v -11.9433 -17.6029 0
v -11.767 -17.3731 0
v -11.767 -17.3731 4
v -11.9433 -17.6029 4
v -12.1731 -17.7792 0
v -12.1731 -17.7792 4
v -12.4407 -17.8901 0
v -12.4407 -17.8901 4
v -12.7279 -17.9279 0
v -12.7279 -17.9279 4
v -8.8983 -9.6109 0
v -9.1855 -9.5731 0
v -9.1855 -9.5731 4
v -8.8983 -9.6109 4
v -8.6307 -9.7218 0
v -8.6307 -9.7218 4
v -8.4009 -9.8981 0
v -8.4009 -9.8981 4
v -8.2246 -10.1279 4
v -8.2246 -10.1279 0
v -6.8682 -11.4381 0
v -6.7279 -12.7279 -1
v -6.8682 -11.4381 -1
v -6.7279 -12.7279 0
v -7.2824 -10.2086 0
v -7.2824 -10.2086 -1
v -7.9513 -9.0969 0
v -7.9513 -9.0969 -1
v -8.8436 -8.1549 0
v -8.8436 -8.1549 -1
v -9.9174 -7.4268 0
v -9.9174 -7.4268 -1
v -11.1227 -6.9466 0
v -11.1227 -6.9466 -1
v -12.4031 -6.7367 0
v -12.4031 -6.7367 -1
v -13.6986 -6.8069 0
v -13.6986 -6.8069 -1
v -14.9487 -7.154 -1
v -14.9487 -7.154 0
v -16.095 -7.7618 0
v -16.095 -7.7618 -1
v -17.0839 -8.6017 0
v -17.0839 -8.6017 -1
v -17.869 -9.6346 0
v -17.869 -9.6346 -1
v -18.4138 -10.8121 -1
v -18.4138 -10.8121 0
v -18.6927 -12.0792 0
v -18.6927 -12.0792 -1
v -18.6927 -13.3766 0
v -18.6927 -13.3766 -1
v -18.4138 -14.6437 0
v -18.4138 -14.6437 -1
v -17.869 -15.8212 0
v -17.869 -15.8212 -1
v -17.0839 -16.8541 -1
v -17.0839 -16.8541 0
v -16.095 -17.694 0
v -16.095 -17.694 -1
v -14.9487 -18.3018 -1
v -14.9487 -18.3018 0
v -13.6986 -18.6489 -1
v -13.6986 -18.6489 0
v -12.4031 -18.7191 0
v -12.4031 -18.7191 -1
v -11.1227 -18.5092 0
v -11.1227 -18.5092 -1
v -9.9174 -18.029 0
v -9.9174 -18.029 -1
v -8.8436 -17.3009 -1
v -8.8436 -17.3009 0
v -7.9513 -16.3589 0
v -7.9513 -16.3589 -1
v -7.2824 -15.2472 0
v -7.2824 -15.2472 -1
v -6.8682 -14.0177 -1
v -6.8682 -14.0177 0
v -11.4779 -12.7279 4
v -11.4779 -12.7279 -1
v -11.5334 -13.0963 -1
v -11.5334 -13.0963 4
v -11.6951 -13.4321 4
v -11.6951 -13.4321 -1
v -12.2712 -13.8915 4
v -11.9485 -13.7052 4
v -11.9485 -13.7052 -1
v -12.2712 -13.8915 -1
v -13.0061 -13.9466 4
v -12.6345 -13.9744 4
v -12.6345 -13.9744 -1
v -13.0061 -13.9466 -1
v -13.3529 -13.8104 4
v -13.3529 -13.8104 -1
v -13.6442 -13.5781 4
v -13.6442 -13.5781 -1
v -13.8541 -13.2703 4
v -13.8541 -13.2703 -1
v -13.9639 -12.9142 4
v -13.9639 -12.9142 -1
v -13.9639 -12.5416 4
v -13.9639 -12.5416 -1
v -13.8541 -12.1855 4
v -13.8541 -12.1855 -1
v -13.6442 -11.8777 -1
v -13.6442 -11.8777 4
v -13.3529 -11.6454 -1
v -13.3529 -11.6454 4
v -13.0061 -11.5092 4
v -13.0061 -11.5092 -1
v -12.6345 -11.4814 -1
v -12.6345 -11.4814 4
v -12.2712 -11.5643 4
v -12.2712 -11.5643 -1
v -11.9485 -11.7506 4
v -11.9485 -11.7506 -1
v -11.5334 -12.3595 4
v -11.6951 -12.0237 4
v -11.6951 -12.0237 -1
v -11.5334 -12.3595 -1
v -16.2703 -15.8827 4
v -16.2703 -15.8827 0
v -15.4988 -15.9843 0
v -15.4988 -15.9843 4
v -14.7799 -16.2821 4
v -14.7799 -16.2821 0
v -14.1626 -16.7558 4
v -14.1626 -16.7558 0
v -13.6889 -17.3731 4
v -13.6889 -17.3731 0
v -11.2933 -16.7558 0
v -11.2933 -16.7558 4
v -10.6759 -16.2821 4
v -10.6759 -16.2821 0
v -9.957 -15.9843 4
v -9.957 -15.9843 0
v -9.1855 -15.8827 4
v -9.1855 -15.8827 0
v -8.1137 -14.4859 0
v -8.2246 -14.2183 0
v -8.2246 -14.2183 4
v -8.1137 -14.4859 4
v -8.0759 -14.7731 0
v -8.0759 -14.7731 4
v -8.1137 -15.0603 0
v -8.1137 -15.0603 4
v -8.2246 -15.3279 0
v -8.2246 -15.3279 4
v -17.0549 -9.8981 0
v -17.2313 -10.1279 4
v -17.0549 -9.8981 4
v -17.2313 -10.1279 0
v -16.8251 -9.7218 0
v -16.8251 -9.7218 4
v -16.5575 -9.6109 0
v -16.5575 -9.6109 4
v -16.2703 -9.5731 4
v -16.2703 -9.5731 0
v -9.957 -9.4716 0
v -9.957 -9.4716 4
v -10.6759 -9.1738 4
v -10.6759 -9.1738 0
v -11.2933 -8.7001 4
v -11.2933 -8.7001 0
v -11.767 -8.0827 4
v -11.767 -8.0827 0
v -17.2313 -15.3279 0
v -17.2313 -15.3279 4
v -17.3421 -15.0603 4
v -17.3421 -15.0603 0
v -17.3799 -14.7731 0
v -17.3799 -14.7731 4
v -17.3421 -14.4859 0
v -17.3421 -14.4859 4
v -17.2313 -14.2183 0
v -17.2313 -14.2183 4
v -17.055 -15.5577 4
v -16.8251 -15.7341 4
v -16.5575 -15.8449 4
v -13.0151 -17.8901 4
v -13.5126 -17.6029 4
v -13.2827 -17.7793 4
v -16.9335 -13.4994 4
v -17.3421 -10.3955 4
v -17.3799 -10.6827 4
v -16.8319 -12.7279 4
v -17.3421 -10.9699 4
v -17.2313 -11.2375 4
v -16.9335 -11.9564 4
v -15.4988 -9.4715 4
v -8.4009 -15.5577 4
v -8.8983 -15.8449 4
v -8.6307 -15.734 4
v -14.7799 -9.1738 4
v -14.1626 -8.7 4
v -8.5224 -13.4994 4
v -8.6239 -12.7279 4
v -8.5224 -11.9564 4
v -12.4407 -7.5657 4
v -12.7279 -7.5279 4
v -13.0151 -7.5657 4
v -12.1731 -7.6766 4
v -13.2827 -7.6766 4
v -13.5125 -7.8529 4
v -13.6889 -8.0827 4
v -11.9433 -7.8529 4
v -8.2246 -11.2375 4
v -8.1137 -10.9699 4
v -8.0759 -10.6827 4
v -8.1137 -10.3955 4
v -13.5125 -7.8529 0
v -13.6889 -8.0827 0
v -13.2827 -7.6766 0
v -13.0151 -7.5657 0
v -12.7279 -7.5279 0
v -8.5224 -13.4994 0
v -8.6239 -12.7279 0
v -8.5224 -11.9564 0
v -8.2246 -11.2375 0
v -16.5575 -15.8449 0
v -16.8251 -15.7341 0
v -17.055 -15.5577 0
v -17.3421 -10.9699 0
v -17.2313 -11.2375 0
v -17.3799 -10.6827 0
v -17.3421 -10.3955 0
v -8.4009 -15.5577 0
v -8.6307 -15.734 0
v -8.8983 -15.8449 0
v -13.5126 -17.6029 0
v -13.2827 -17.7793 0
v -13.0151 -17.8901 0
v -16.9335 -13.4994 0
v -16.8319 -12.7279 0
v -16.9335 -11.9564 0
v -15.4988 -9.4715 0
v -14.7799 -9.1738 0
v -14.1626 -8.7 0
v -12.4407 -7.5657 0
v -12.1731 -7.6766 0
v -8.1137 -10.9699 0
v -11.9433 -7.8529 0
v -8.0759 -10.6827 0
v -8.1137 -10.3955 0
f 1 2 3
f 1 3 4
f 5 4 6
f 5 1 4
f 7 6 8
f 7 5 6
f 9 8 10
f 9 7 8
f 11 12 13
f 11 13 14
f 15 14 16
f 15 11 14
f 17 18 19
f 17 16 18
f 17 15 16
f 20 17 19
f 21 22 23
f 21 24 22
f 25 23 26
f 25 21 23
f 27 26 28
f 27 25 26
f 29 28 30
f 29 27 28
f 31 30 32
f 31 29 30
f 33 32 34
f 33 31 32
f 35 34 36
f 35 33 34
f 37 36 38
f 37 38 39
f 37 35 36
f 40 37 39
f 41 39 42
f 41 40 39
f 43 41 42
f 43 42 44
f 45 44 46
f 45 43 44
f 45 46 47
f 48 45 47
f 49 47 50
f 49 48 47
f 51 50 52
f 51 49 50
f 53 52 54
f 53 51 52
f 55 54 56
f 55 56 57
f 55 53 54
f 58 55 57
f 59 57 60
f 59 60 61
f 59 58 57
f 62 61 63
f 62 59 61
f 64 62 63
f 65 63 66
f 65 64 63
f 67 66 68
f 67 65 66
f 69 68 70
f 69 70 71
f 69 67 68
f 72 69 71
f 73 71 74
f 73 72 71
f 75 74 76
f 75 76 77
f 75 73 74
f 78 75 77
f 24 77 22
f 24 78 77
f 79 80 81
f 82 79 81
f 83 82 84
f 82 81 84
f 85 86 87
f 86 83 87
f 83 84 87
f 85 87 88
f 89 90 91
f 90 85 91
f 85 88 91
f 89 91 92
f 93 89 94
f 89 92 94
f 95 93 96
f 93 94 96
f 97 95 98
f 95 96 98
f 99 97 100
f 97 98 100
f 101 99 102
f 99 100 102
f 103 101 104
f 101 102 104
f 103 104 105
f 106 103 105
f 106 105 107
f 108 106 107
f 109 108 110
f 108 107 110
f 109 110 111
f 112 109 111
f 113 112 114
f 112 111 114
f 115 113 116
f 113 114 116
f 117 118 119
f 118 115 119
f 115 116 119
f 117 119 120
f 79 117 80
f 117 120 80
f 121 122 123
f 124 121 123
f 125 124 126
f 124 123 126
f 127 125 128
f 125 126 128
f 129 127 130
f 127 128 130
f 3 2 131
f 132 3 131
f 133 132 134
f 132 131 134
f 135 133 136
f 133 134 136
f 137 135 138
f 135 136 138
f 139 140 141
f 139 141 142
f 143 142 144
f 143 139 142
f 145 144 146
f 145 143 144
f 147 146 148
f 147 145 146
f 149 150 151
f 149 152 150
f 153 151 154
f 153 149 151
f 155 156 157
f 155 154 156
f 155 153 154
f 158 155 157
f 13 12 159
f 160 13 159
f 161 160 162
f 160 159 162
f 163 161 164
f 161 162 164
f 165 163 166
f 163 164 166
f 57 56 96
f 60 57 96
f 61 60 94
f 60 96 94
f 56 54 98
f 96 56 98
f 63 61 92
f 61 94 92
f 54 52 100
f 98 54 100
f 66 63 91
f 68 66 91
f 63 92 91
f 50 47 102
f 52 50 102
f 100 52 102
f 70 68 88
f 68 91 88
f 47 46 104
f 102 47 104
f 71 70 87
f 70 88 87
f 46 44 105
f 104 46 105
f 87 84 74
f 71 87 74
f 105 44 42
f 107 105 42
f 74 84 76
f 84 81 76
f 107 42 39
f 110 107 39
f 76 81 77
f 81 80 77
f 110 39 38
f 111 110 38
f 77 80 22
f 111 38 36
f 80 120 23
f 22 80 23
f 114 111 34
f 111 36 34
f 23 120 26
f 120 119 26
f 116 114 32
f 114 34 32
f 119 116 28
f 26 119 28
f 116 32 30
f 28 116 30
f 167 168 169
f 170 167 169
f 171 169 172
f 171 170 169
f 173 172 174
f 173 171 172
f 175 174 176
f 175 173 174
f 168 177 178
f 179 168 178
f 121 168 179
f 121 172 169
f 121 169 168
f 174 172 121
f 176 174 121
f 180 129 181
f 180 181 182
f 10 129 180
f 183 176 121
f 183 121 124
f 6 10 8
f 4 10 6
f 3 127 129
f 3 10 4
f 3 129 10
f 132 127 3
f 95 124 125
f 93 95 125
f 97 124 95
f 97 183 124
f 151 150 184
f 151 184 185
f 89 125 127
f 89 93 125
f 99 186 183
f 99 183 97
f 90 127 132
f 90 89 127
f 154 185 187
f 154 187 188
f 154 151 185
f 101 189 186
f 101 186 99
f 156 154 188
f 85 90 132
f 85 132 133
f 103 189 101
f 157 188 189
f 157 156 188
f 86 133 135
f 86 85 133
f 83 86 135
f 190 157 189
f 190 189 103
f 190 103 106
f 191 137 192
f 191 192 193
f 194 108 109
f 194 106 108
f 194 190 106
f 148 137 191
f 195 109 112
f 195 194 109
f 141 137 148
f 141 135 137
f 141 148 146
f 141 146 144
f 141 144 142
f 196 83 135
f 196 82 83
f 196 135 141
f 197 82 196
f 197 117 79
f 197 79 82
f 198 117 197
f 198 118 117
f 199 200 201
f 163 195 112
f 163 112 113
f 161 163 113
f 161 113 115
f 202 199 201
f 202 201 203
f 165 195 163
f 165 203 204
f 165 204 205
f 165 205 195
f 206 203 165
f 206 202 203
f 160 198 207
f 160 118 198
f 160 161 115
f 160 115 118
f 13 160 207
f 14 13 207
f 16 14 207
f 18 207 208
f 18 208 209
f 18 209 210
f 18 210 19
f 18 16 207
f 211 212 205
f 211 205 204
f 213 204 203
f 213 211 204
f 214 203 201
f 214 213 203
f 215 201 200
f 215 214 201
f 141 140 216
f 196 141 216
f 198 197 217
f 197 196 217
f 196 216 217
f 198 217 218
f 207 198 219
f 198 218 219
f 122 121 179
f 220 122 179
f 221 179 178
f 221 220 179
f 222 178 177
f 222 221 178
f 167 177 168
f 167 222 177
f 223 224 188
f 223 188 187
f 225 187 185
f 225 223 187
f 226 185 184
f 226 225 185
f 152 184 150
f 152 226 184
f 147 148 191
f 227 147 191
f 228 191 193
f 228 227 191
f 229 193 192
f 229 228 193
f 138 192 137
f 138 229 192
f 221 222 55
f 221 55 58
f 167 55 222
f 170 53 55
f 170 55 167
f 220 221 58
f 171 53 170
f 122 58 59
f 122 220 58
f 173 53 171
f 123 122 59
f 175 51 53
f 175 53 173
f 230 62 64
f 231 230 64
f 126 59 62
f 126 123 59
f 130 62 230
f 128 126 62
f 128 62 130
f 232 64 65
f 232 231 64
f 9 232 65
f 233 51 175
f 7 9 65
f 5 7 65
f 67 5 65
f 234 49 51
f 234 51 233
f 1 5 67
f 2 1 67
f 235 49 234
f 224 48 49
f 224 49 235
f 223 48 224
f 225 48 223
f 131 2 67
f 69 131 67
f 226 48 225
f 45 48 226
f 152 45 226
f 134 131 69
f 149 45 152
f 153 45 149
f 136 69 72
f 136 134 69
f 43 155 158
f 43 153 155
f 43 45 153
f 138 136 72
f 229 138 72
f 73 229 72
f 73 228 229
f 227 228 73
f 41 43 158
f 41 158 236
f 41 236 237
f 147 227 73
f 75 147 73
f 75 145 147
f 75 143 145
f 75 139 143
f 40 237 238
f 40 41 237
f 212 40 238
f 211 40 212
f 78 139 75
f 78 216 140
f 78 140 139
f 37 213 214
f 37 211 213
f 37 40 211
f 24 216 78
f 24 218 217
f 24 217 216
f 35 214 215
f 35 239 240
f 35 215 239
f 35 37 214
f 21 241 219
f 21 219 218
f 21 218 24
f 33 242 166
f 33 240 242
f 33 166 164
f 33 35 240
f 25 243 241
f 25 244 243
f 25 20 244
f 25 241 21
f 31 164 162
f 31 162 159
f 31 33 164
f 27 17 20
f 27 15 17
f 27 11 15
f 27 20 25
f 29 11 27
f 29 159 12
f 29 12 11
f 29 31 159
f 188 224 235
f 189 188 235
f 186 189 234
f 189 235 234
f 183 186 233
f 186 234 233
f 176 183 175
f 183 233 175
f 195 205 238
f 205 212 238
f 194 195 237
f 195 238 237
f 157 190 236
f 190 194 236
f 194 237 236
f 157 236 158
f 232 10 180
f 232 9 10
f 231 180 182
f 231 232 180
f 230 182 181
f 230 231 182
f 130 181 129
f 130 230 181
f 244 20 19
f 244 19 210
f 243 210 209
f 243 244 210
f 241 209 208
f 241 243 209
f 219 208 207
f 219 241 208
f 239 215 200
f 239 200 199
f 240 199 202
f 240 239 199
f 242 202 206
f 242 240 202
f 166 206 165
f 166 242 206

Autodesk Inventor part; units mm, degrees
ref_plane "YZ Plane" through (0, 0, 0) normal (1, 0, 0) x (0, 1, 0)
ref_plane "XZ Plane" through (0, 0, 0) normal (0, 1, 0) x (-1, 0, 0)
ref_plane "XY Plane" through (0, 0, 0) normal (0, 0, 1) x (1, 0, 0)
sketch "スケッチ1" plane through (0, 0, 0) normal (0, 0, 1) x (1, 0, 0)
  arc A0 (-16.2703, -9.5731) -> (-13.6889, -8.0827) centre (-16.2703, -6.5923) ccw
  arc A1 (-16.2703, -9.5731) -> (-17.2313, -10.1279) centre (-16.2703, -10.6827) ccw
  arc A2 (-17.2313, -10.1279) -> (-17.2313, -11.2375) centre (-16.2703, -10.6827) ccw
  arc A3 (-17.2313, -14.2183) -> (-17.2313, -11.2375) centre (-19.8127, -12.7279) ccw
  arc A4 (-17.2313, -14.2183) -> (-17.2313, -15.3279) centre (-16.2703, -14.7731) ccw
  arc A5 (-17.2313, -15.3279) -> (-16.2703, -15.8827) centre (-16.2703, -14.7731) ccw
  arc A6 (-13.6889, -17.3731) -> (-16.2703, -15.8827) centre (-16.2703, -18.8635) ccw
  arc A7 (-13.6889, -17.3731) -> (-12.7279, -17.9279) centre (-12.7279, -16.8183) ccw
  arc A8 (-12.7279, -17.9279) -> (-11.767, -17.3731) centre (-12.7279, -16.8183) ccw
  arc A9 (-9.1855, -15.8827) -> (-11.767, -17.3731) centre (-9.1855, -18.8635) ccw
  arc A10 (-9.1855, -15.8827) -> (-8.2246, -15.3279) centre (-9.1855, -14.7731) ccw
  arc A11 (-8.2246, -15.3279) -> (-8.2246, -14.2183) centre (-9.1855, -14.7731) ccw
  arc A12 (-8.2246, -11.2375) -> (-8.2246, -14.2183) centre (-5.6431, -12.7279) ccw
  arc A13 (-8.2246, -11.2375) -> (-8.2246, -10.1279) centre (-9.1855, -10.6827) ccw
  arc A14 (-8.2246, -10.1279) -> (-9.1855, -9.5731) centre (-9.1855, -10.6827) ccw
  arc A15 (-11.767, -8.0827) -> (-9.1855, -9.5731) centre (-9.1855, -6.5923) ccw
  arc A16 (-11.767, -8.0827) -> (-12.7279, -7.5279) centre (-12.7279, -8.6375) ccw
  arc A17 (-12.7279, -7.5279) -> (-13.6889, -8.0827) centre (-12.7279, -8.6375) ccw
  circle A18 centre (-12.7279, -12.7279) radius 1.5 construction
  circle A19 centre (-12.7279, -12.7279) radius 1.25
  circle A20 centre (-12.7279, -12.7279) radius 6
  point P0 (0, 0)
  point P1 (0, 0)
  dimension "d0" = 2.5
extrude "押し出し1" add sketch "スケッチ1" against normal blind 1 contours A0 A17 A16 A15 A14 A13 A12 A11 A10 A9 A8 A7 A6 A5 A4 A3 A2 A1 | A20
extrude "押し出し2" add sketch "スケッチ1" along normal blind 4 contours A0 A17 A16 A15 A14 A13 A12 A11 A10 A9 A8 A7 A6 A5 A4 A3 A2 A1
sketch "書き出し" plane through (0, 0, 4) normal (0, 0, 1) x (1, 0, 0)
  arc A0 (-13.6889, -17.3731) -> (-11.767, -17.3731) centre (-12.7279, -16.8183) ccw projected
  arc A1 (-9.1855, -15.8827) -> (-11.767, -17.3731) centre (-9.1855, -18.8635) ccw projected
  arc A2 (-9.1855, -15.8827) -> (-8.2246, -14.2183) centre (-9.1855, -14.7731) ccw projected
  arc A3 (-8.2246, -11.2375) -> (-8.2246, -14.2183) centre (-5.6431, -12.7279) ccw projected
  arc A4 (-8.2246, -11.2375) -> (-9.1855, -9.5731) centre (-9.1855, -10.6827) ccw projected
  arc A5 (-11.767, -8.0827) -> (-9.1855, -9.5731) centre (-9.1855, -6.5923) ccw projected
  arc A6 (-11.767, -8.0827) -> (-13.6889, -8.0827) centre (-12.7279, -8.6375) ccw projected
  arc A7 (-16.2703, -9.5731) -> (-13.6889, -8.0827) centre (-16.2703, -6.5923) ccw projected
  arc A8 (-16.2703, -9.5731) -> (-17.2313, -11.2375) centre (-16.2703, -10.6827) ccw projected
  arc A9 (-17.2313, -14.2183) -> (-17.2313, -11.2375) centre (-19.8127, -12.7279) ccw projected
  arc A10 (-17.2313, -14.2183) -> (-16.2703, -15.8827) centre (-16.2703, -14.7731) ccw projected
  arc A11 (-13.6889, -17.3731) -> (-16.2703, -15.8827) centre (-16.2703, -18.8635) ccw projected
  circle A12 centre (-12.7279, -12.7279) radius 1.25 projected
  arc A13 (-13.6889, -17.3731) -> (-16.2703, -15.8827) centre (-16.2703, -18.8635) ccw projected
  arc A14 (-17.2313, -14.2183) -> (-16.2703, -15.8827) centre (-16.2703, -14.7731) ccw projected
  arc A15 (-17.2313, -14.2183) -> (-17.2313, -11.2375) centre (-19.8127, -12.7279) ccw projected
  arc A16 (-16.2703, -9.5731) -> (-17.2313, -11.2375) centre (-16.2703, -10.6827) ccw projected
  arc A17 (-16.2703, -9.5731) -> (-13.6889, -8.0827) centre (-16.2703, -6.5923) ccw projected
  arc A18 (-11.767, -8.0827) -> (-13.6889, -8.0827) centre (-12.7279, -8.6375) ccw projected
  arc A19 (-11.767, -8.0827) -> (-9.1855, -9.5731) centre (-9.1855, -6.5923) ccw projected
  arc A20 (-8.2246, -11.2375) -> (-9.1855, -9.5731) centre (-9.1855, -10.6827) ccw projected
  arc A21 (-8.2246, -11.2375) -> (-8.2246, -14.2183) centre (-5.6431, -12.7279) ccw projected
  arc A22 (-9.1855, -15.8827) -> (-8.2246, -14.2183) centre (-9.1855, -14.7731) ccw projected
  arc A23 (-9.1855, -15.8827) -> (-11.767, -17.3731) centre (-9.1855, -18.8635) ccw projected
  arc A24 (-13.6889, -17.3731) -> (-11.767, -17.3731) centre (-12.7279, -16.8183) ccw projected
  circle A25 centre (-12.7279, -12.7279) radius 6 projected
  circle A26 centre (-12.7279, -12.7279) radius 7.5
  point P0 (0, 0)
  dimension "d5" = 1.5
properties part number "原動節接続部v2内-1" material "アルミニウム 2014-T4"
